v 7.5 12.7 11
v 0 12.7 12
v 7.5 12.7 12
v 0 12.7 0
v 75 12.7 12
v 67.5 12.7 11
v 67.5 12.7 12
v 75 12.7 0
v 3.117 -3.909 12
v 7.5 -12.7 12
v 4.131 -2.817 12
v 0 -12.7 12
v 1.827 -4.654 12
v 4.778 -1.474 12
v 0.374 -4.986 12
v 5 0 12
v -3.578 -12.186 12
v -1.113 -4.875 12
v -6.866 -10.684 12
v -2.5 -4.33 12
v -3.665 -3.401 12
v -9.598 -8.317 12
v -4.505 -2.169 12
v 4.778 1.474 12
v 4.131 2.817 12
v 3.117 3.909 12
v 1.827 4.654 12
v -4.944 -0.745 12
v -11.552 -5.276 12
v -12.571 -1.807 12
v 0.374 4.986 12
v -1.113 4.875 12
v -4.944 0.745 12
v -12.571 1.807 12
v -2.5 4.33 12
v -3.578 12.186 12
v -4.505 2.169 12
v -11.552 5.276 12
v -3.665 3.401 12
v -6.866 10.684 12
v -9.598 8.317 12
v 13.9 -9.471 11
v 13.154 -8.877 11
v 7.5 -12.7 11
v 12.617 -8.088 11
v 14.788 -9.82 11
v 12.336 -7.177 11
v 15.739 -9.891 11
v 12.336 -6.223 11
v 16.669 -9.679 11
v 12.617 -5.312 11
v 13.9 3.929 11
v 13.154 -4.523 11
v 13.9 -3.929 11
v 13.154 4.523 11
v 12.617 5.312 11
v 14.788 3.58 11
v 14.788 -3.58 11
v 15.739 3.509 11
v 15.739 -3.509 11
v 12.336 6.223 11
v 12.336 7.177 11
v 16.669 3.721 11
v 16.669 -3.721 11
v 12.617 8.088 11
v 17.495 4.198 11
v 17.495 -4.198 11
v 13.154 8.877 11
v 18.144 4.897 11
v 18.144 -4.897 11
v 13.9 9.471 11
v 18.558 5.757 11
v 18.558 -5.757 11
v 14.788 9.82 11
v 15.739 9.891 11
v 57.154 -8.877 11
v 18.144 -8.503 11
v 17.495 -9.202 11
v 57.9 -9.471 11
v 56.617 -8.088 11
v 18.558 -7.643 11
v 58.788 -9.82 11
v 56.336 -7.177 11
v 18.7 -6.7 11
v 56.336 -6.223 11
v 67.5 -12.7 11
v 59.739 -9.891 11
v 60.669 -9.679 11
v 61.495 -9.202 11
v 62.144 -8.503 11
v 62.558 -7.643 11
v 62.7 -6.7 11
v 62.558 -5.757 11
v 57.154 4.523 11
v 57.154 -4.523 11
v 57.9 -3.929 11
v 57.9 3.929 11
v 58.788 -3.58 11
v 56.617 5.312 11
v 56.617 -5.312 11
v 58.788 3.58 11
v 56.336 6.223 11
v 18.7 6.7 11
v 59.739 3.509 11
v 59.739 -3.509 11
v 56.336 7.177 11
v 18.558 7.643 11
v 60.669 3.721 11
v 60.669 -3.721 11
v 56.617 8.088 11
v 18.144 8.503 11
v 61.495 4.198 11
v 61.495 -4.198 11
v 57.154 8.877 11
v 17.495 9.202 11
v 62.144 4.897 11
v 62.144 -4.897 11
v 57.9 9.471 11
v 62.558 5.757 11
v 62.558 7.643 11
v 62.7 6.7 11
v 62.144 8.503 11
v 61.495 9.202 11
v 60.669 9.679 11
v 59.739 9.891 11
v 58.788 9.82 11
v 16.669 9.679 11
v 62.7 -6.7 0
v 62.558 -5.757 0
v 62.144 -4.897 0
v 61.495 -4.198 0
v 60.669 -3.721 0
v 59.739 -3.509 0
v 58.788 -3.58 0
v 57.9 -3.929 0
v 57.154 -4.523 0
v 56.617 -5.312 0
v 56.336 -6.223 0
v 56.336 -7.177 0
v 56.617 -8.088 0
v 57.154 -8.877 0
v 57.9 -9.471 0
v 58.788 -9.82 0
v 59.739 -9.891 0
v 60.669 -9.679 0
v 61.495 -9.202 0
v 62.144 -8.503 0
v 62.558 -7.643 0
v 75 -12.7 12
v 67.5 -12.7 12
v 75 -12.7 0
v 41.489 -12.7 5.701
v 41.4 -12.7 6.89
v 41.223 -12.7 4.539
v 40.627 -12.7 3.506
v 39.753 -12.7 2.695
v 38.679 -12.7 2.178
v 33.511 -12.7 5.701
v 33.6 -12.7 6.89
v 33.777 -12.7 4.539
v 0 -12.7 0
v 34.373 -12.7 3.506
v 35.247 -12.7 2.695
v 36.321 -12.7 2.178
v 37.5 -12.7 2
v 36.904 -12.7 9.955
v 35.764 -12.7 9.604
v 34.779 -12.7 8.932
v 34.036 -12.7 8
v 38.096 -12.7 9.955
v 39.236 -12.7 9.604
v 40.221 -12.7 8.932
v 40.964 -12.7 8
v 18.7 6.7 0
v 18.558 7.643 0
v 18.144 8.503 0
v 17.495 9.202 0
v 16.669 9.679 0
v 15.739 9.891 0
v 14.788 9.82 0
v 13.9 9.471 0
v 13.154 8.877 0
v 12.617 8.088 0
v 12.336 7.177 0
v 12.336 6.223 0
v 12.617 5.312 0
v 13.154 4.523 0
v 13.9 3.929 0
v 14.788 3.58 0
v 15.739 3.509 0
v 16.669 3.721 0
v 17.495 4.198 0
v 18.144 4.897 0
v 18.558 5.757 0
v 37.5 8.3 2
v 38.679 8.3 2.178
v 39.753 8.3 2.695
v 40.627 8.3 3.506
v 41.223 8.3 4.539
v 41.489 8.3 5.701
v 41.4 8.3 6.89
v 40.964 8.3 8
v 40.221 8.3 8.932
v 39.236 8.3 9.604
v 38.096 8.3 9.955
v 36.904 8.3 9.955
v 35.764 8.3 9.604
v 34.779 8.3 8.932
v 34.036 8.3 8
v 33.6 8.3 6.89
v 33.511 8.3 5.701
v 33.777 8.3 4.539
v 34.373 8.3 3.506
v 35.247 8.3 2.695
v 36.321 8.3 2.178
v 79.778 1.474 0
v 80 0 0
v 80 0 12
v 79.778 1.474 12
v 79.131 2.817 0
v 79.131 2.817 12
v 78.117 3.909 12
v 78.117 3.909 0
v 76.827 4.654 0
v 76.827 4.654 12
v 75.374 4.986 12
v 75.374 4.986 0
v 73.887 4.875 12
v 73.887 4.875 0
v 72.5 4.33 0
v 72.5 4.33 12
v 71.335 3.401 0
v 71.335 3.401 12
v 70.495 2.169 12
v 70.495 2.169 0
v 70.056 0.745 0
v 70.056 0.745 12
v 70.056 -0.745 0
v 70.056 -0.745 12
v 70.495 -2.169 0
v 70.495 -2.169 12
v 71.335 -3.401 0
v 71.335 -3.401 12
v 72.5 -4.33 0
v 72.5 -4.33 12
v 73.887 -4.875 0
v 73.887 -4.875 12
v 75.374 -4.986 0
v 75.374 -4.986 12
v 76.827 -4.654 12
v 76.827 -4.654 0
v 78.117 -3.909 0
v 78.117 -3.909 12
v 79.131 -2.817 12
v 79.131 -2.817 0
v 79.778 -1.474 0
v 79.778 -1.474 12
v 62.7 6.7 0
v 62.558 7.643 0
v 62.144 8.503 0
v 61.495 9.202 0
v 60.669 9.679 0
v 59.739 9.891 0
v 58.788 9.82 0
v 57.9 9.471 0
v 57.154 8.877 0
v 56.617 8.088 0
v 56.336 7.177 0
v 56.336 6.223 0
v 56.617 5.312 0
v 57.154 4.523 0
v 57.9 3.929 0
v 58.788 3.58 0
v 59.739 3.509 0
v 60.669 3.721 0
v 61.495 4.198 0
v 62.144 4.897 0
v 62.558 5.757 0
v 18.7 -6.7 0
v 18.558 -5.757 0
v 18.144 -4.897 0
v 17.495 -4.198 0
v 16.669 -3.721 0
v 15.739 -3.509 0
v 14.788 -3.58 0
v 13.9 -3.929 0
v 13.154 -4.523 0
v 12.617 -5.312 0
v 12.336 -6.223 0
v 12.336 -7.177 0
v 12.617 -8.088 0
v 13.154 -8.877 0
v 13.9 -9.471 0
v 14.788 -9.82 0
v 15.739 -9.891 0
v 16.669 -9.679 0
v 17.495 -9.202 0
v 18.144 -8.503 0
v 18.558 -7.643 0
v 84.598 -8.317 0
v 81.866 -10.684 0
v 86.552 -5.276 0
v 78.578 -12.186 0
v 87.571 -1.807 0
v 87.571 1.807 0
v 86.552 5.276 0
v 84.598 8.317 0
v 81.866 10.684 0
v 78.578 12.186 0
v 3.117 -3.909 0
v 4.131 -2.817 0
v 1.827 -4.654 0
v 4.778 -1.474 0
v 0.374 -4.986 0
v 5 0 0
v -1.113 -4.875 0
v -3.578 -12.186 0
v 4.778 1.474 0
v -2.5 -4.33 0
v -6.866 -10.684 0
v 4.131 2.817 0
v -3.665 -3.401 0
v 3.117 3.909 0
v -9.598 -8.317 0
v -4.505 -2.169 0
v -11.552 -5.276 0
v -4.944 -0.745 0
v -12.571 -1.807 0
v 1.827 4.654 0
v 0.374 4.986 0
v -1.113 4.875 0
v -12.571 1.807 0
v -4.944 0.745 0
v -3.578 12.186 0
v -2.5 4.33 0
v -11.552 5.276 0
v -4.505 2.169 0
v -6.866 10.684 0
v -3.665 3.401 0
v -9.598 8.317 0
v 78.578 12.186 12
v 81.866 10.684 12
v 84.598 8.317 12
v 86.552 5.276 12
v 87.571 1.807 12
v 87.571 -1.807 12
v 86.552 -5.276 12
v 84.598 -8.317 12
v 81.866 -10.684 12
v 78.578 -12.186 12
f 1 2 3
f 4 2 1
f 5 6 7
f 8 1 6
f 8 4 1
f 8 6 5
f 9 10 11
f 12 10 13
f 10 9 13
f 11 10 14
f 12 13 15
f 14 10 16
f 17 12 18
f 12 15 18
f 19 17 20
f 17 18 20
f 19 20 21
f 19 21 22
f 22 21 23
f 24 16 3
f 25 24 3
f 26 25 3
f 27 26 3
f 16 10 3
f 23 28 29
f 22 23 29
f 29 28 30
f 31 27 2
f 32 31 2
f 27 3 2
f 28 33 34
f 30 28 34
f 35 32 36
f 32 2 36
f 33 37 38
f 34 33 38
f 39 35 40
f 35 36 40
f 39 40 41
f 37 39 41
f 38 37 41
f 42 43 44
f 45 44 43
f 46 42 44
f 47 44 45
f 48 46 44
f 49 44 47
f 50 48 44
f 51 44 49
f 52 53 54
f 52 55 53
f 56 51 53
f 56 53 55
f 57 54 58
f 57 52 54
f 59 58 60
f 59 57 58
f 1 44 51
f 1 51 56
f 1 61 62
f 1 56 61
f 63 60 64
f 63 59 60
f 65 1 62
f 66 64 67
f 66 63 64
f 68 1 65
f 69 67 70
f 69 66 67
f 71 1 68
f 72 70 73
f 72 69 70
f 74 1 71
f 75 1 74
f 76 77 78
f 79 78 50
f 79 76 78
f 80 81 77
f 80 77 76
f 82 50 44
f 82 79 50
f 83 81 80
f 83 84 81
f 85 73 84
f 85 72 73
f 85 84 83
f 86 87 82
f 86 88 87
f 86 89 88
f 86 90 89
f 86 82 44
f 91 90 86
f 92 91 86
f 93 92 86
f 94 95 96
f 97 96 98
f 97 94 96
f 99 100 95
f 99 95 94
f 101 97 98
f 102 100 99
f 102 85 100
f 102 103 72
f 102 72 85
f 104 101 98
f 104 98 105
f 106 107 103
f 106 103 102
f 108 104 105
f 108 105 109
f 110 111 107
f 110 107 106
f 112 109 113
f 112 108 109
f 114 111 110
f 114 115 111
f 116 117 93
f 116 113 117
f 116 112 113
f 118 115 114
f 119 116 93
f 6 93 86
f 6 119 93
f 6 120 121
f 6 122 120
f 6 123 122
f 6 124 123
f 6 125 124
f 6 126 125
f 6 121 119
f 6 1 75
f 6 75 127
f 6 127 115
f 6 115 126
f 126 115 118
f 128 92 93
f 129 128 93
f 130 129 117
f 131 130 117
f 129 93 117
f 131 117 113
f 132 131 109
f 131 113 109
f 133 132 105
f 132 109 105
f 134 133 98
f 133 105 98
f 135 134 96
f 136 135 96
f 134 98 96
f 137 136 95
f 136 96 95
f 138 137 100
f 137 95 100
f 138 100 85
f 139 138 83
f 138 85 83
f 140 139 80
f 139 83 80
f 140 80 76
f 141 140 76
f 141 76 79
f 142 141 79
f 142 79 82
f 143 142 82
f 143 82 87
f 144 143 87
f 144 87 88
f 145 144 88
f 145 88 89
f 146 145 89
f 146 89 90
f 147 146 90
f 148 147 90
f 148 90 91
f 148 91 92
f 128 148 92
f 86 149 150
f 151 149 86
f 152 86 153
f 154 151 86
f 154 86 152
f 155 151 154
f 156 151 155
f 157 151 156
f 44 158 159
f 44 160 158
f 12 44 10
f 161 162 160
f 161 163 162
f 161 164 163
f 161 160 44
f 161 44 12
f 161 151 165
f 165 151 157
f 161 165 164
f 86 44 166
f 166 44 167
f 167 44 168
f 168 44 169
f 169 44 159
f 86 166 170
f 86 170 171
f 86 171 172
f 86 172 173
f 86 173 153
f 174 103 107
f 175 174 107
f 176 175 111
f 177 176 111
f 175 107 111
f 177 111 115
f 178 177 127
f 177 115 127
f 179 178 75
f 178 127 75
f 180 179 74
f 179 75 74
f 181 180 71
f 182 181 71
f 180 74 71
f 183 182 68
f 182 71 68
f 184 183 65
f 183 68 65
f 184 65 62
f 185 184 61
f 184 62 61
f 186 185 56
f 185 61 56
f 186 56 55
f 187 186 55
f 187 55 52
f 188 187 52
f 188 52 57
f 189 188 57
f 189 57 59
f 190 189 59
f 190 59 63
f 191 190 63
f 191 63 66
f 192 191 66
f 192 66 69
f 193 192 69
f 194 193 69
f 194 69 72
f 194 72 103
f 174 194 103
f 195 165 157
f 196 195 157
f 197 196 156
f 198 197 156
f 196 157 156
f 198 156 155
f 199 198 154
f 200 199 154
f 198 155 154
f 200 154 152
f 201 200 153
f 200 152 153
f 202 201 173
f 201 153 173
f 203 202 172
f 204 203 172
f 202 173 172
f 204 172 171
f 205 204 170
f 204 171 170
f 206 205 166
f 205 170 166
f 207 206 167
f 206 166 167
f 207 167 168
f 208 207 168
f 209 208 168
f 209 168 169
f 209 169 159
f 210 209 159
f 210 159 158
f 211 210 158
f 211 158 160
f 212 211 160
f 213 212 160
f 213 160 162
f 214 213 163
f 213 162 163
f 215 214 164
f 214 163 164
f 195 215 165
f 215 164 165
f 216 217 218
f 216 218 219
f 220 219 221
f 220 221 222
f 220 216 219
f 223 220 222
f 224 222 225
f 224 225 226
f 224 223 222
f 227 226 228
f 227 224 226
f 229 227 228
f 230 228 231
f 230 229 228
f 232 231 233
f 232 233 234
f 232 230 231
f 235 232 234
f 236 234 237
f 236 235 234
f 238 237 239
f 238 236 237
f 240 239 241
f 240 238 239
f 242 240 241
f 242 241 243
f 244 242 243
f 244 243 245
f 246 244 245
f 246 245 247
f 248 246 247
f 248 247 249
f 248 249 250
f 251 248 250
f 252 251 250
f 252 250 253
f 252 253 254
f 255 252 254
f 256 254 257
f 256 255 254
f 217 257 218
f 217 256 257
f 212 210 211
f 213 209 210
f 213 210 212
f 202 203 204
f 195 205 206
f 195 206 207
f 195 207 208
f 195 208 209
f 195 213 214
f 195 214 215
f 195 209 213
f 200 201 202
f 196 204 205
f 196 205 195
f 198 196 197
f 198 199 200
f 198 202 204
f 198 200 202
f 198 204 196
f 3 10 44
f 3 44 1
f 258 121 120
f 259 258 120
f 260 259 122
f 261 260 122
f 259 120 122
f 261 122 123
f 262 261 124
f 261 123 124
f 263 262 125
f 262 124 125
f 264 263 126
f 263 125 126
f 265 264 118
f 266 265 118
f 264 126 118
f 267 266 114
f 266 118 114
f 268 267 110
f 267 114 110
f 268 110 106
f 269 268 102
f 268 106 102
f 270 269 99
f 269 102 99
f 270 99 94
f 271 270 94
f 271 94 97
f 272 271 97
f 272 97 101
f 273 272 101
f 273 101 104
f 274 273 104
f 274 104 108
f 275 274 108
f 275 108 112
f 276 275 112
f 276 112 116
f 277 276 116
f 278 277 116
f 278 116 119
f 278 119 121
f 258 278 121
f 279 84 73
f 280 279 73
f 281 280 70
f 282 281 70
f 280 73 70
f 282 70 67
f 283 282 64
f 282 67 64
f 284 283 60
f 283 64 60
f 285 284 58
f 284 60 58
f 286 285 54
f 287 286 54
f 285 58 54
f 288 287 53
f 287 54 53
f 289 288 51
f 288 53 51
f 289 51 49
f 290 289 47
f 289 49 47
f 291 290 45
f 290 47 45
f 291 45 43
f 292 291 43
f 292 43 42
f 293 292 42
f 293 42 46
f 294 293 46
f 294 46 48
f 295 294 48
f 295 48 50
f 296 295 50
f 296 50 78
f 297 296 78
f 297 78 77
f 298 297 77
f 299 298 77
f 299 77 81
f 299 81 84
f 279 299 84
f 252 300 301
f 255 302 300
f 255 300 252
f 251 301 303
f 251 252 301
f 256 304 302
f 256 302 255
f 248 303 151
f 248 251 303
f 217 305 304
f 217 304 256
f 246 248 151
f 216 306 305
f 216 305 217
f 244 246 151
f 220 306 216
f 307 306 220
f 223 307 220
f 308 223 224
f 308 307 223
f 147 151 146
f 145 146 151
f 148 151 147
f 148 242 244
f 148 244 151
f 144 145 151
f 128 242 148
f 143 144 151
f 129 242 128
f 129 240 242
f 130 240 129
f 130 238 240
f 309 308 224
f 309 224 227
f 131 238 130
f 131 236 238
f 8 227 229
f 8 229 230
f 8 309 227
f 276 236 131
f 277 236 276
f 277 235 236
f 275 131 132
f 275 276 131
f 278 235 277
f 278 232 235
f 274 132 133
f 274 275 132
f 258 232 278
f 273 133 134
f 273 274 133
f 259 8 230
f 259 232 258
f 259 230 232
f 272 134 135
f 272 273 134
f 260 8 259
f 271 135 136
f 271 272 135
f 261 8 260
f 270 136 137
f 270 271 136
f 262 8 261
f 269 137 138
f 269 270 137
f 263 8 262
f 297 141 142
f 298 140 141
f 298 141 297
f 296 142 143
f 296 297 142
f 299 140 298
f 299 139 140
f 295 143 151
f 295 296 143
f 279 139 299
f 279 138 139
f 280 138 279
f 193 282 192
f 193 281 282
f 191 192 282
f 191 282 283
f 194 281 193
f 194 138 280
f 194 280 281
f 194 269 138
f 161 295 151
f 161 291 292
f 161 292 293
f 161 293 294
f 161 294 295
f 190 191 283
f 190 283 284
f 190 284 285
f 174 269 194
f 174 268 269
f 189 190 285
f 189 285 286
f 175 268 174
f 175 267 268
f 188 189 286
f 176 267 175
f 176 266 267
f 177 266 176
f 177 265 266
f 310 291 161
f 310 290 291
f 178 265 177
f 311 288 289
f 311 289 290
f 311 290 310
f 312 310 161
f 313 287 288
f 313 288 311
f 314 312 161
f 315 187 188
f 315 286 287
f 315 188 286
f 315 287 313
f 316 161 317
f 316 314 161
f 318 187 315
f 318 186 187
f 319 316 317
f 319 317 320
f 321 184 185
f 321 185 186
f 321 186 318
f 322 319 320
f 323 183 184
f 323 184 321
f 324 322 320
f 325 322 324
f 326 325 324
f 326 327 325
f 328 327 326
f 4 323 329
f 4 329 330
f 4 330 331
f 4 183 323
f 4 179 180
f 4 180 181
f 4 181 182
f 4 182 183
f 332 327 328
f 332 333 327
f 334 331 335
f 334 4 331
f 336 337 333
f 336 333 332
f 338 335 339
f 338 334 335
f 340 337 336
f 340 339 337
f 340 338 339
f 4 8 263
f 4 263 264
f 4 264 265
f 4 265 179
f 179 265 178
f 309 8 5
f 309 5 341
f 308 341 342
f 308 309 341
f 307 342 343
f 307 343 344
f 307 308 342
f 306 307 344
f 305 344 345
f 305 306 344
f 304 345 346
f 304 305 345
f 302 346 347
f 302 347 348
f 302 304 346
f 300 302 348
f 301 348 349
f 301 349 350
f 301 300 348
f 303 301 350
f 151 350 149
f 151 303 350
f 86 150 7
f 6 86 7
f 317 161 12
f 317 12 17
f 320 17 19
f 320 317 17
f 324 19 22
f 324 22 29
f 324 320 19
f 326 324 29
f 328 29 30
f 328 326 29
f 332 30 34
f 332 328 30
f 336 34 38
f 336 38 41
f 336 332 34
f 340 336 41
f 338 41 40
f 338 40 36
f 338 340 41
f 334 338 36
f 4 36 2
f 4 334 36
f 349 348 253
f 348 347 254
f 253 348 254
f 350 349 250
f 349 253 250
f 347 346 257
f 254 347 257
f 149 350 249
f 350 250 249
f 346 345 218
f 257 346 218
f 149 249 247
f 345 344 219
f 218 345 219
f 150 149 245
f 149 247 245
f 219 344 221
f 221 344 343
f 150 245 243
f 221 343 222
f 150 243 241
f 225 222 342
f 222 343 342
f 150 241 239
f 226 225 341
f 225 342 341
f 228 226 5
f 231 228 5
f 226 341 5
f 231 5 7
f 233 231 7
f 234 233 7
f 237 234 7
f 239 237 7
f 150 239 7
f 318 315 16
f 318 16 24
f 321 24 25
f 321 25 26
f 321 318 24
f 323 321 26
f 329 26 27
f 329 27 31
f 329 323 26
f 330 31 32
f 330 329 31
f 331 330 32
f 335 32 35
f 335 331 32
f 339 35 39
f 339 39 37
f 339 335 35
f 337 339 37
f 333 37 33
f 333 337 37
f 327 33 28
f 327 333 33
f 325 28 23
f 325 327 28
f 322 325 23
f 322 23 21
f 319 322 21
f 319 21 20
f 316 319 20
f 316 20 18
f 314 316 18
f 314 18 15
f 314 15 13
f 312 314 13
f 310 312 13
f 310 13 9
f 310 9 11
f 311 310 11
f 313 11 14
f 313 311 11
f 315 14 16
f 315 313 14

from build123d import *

# Parameters (mm, degrees)
CROQUIS1_R              = 5
SALIENTE_EXTRUIR1_DEPTH = 12
CROQUIS2_R              = 4
CORTAR_EXTRUIR1_DEPTH   = 21
CROQUIS3_W              = 60
CROQUIS3_H              = 34
CORTAR_EXTRUIR4_DEPTH   = 1
CROQUIS5_R              = 3.2
CORTAR_EXTRUIR5_DEPTH   = 90.423598675


with BuildPart() as part:
    # Croquis1 → Saliente-Extruir1 (new body)
    with BuildSketch(Plane.XY):
        with BuildLine():
            Line((0, 12.7), (75, 12.7))
            ThreePointArc((75, 12.7), (87.7, 0), (75, -12.7))
            Line((75, -12.7), (0, -12.7))
            ThreePointArc((0, -12.7), (-12.7, 0), (0, 12.7))
        make_face()
        Circle(CROQUIS1_R, mode=Mode.SUBTRACT)
        with Locations((75, 0)):
            Circle(CROQUIS1_R, mode=Mode.SUBTRACT)
    extrude(amount=SALIENTE_EXTRUIR1_DEPTH)

    # Croquis2 → Cortar-Extruir1 (cut)
    with BuildSketch(Plane.XZ.offset(12.7)):
        with Locations(Location((37.5, 6, 0), (0, 0, 270))):
            Circle(CROQUIS2_R)
    extrude(amount=-CORTAR_EXTRUIR1_DEPTH, mode=Mode.SUBTRACT)

    # Croquis3 → Cortar-Extruir4 (cut)
    with BuildSketch(Plane.XY.offset(12)):
        with Locations((37.5, 0)):
            Rectangle(CROQUIS3_W, CROQUIS3_H)
    extrude(amount=-CORTAR_EXTRUIR4_DEPTH, mode=Mode.SUBTRACT)

    # Croquis5 → Cortar-Extruir5 (cut, through all)
    with BuildSketch(Plane.XY.offset(12)):
        with Locations((59.5, -6.7)):
            Circle(CROQUIS5_R)
        with Locations((59.5, 6.7)):
            Circle(CROQUIS5_R)
        with Locations((15.5, 6.7)):
            Circle(CROQUIS5_R)
        with Locations((15.5, -6.7)):
            Circle(CROQUIS5_R)
    extrude(amount=-CORTAR_EXTRUIR5_DEPTH, mode=Mode.SUBTRACT)


solid = part.part
